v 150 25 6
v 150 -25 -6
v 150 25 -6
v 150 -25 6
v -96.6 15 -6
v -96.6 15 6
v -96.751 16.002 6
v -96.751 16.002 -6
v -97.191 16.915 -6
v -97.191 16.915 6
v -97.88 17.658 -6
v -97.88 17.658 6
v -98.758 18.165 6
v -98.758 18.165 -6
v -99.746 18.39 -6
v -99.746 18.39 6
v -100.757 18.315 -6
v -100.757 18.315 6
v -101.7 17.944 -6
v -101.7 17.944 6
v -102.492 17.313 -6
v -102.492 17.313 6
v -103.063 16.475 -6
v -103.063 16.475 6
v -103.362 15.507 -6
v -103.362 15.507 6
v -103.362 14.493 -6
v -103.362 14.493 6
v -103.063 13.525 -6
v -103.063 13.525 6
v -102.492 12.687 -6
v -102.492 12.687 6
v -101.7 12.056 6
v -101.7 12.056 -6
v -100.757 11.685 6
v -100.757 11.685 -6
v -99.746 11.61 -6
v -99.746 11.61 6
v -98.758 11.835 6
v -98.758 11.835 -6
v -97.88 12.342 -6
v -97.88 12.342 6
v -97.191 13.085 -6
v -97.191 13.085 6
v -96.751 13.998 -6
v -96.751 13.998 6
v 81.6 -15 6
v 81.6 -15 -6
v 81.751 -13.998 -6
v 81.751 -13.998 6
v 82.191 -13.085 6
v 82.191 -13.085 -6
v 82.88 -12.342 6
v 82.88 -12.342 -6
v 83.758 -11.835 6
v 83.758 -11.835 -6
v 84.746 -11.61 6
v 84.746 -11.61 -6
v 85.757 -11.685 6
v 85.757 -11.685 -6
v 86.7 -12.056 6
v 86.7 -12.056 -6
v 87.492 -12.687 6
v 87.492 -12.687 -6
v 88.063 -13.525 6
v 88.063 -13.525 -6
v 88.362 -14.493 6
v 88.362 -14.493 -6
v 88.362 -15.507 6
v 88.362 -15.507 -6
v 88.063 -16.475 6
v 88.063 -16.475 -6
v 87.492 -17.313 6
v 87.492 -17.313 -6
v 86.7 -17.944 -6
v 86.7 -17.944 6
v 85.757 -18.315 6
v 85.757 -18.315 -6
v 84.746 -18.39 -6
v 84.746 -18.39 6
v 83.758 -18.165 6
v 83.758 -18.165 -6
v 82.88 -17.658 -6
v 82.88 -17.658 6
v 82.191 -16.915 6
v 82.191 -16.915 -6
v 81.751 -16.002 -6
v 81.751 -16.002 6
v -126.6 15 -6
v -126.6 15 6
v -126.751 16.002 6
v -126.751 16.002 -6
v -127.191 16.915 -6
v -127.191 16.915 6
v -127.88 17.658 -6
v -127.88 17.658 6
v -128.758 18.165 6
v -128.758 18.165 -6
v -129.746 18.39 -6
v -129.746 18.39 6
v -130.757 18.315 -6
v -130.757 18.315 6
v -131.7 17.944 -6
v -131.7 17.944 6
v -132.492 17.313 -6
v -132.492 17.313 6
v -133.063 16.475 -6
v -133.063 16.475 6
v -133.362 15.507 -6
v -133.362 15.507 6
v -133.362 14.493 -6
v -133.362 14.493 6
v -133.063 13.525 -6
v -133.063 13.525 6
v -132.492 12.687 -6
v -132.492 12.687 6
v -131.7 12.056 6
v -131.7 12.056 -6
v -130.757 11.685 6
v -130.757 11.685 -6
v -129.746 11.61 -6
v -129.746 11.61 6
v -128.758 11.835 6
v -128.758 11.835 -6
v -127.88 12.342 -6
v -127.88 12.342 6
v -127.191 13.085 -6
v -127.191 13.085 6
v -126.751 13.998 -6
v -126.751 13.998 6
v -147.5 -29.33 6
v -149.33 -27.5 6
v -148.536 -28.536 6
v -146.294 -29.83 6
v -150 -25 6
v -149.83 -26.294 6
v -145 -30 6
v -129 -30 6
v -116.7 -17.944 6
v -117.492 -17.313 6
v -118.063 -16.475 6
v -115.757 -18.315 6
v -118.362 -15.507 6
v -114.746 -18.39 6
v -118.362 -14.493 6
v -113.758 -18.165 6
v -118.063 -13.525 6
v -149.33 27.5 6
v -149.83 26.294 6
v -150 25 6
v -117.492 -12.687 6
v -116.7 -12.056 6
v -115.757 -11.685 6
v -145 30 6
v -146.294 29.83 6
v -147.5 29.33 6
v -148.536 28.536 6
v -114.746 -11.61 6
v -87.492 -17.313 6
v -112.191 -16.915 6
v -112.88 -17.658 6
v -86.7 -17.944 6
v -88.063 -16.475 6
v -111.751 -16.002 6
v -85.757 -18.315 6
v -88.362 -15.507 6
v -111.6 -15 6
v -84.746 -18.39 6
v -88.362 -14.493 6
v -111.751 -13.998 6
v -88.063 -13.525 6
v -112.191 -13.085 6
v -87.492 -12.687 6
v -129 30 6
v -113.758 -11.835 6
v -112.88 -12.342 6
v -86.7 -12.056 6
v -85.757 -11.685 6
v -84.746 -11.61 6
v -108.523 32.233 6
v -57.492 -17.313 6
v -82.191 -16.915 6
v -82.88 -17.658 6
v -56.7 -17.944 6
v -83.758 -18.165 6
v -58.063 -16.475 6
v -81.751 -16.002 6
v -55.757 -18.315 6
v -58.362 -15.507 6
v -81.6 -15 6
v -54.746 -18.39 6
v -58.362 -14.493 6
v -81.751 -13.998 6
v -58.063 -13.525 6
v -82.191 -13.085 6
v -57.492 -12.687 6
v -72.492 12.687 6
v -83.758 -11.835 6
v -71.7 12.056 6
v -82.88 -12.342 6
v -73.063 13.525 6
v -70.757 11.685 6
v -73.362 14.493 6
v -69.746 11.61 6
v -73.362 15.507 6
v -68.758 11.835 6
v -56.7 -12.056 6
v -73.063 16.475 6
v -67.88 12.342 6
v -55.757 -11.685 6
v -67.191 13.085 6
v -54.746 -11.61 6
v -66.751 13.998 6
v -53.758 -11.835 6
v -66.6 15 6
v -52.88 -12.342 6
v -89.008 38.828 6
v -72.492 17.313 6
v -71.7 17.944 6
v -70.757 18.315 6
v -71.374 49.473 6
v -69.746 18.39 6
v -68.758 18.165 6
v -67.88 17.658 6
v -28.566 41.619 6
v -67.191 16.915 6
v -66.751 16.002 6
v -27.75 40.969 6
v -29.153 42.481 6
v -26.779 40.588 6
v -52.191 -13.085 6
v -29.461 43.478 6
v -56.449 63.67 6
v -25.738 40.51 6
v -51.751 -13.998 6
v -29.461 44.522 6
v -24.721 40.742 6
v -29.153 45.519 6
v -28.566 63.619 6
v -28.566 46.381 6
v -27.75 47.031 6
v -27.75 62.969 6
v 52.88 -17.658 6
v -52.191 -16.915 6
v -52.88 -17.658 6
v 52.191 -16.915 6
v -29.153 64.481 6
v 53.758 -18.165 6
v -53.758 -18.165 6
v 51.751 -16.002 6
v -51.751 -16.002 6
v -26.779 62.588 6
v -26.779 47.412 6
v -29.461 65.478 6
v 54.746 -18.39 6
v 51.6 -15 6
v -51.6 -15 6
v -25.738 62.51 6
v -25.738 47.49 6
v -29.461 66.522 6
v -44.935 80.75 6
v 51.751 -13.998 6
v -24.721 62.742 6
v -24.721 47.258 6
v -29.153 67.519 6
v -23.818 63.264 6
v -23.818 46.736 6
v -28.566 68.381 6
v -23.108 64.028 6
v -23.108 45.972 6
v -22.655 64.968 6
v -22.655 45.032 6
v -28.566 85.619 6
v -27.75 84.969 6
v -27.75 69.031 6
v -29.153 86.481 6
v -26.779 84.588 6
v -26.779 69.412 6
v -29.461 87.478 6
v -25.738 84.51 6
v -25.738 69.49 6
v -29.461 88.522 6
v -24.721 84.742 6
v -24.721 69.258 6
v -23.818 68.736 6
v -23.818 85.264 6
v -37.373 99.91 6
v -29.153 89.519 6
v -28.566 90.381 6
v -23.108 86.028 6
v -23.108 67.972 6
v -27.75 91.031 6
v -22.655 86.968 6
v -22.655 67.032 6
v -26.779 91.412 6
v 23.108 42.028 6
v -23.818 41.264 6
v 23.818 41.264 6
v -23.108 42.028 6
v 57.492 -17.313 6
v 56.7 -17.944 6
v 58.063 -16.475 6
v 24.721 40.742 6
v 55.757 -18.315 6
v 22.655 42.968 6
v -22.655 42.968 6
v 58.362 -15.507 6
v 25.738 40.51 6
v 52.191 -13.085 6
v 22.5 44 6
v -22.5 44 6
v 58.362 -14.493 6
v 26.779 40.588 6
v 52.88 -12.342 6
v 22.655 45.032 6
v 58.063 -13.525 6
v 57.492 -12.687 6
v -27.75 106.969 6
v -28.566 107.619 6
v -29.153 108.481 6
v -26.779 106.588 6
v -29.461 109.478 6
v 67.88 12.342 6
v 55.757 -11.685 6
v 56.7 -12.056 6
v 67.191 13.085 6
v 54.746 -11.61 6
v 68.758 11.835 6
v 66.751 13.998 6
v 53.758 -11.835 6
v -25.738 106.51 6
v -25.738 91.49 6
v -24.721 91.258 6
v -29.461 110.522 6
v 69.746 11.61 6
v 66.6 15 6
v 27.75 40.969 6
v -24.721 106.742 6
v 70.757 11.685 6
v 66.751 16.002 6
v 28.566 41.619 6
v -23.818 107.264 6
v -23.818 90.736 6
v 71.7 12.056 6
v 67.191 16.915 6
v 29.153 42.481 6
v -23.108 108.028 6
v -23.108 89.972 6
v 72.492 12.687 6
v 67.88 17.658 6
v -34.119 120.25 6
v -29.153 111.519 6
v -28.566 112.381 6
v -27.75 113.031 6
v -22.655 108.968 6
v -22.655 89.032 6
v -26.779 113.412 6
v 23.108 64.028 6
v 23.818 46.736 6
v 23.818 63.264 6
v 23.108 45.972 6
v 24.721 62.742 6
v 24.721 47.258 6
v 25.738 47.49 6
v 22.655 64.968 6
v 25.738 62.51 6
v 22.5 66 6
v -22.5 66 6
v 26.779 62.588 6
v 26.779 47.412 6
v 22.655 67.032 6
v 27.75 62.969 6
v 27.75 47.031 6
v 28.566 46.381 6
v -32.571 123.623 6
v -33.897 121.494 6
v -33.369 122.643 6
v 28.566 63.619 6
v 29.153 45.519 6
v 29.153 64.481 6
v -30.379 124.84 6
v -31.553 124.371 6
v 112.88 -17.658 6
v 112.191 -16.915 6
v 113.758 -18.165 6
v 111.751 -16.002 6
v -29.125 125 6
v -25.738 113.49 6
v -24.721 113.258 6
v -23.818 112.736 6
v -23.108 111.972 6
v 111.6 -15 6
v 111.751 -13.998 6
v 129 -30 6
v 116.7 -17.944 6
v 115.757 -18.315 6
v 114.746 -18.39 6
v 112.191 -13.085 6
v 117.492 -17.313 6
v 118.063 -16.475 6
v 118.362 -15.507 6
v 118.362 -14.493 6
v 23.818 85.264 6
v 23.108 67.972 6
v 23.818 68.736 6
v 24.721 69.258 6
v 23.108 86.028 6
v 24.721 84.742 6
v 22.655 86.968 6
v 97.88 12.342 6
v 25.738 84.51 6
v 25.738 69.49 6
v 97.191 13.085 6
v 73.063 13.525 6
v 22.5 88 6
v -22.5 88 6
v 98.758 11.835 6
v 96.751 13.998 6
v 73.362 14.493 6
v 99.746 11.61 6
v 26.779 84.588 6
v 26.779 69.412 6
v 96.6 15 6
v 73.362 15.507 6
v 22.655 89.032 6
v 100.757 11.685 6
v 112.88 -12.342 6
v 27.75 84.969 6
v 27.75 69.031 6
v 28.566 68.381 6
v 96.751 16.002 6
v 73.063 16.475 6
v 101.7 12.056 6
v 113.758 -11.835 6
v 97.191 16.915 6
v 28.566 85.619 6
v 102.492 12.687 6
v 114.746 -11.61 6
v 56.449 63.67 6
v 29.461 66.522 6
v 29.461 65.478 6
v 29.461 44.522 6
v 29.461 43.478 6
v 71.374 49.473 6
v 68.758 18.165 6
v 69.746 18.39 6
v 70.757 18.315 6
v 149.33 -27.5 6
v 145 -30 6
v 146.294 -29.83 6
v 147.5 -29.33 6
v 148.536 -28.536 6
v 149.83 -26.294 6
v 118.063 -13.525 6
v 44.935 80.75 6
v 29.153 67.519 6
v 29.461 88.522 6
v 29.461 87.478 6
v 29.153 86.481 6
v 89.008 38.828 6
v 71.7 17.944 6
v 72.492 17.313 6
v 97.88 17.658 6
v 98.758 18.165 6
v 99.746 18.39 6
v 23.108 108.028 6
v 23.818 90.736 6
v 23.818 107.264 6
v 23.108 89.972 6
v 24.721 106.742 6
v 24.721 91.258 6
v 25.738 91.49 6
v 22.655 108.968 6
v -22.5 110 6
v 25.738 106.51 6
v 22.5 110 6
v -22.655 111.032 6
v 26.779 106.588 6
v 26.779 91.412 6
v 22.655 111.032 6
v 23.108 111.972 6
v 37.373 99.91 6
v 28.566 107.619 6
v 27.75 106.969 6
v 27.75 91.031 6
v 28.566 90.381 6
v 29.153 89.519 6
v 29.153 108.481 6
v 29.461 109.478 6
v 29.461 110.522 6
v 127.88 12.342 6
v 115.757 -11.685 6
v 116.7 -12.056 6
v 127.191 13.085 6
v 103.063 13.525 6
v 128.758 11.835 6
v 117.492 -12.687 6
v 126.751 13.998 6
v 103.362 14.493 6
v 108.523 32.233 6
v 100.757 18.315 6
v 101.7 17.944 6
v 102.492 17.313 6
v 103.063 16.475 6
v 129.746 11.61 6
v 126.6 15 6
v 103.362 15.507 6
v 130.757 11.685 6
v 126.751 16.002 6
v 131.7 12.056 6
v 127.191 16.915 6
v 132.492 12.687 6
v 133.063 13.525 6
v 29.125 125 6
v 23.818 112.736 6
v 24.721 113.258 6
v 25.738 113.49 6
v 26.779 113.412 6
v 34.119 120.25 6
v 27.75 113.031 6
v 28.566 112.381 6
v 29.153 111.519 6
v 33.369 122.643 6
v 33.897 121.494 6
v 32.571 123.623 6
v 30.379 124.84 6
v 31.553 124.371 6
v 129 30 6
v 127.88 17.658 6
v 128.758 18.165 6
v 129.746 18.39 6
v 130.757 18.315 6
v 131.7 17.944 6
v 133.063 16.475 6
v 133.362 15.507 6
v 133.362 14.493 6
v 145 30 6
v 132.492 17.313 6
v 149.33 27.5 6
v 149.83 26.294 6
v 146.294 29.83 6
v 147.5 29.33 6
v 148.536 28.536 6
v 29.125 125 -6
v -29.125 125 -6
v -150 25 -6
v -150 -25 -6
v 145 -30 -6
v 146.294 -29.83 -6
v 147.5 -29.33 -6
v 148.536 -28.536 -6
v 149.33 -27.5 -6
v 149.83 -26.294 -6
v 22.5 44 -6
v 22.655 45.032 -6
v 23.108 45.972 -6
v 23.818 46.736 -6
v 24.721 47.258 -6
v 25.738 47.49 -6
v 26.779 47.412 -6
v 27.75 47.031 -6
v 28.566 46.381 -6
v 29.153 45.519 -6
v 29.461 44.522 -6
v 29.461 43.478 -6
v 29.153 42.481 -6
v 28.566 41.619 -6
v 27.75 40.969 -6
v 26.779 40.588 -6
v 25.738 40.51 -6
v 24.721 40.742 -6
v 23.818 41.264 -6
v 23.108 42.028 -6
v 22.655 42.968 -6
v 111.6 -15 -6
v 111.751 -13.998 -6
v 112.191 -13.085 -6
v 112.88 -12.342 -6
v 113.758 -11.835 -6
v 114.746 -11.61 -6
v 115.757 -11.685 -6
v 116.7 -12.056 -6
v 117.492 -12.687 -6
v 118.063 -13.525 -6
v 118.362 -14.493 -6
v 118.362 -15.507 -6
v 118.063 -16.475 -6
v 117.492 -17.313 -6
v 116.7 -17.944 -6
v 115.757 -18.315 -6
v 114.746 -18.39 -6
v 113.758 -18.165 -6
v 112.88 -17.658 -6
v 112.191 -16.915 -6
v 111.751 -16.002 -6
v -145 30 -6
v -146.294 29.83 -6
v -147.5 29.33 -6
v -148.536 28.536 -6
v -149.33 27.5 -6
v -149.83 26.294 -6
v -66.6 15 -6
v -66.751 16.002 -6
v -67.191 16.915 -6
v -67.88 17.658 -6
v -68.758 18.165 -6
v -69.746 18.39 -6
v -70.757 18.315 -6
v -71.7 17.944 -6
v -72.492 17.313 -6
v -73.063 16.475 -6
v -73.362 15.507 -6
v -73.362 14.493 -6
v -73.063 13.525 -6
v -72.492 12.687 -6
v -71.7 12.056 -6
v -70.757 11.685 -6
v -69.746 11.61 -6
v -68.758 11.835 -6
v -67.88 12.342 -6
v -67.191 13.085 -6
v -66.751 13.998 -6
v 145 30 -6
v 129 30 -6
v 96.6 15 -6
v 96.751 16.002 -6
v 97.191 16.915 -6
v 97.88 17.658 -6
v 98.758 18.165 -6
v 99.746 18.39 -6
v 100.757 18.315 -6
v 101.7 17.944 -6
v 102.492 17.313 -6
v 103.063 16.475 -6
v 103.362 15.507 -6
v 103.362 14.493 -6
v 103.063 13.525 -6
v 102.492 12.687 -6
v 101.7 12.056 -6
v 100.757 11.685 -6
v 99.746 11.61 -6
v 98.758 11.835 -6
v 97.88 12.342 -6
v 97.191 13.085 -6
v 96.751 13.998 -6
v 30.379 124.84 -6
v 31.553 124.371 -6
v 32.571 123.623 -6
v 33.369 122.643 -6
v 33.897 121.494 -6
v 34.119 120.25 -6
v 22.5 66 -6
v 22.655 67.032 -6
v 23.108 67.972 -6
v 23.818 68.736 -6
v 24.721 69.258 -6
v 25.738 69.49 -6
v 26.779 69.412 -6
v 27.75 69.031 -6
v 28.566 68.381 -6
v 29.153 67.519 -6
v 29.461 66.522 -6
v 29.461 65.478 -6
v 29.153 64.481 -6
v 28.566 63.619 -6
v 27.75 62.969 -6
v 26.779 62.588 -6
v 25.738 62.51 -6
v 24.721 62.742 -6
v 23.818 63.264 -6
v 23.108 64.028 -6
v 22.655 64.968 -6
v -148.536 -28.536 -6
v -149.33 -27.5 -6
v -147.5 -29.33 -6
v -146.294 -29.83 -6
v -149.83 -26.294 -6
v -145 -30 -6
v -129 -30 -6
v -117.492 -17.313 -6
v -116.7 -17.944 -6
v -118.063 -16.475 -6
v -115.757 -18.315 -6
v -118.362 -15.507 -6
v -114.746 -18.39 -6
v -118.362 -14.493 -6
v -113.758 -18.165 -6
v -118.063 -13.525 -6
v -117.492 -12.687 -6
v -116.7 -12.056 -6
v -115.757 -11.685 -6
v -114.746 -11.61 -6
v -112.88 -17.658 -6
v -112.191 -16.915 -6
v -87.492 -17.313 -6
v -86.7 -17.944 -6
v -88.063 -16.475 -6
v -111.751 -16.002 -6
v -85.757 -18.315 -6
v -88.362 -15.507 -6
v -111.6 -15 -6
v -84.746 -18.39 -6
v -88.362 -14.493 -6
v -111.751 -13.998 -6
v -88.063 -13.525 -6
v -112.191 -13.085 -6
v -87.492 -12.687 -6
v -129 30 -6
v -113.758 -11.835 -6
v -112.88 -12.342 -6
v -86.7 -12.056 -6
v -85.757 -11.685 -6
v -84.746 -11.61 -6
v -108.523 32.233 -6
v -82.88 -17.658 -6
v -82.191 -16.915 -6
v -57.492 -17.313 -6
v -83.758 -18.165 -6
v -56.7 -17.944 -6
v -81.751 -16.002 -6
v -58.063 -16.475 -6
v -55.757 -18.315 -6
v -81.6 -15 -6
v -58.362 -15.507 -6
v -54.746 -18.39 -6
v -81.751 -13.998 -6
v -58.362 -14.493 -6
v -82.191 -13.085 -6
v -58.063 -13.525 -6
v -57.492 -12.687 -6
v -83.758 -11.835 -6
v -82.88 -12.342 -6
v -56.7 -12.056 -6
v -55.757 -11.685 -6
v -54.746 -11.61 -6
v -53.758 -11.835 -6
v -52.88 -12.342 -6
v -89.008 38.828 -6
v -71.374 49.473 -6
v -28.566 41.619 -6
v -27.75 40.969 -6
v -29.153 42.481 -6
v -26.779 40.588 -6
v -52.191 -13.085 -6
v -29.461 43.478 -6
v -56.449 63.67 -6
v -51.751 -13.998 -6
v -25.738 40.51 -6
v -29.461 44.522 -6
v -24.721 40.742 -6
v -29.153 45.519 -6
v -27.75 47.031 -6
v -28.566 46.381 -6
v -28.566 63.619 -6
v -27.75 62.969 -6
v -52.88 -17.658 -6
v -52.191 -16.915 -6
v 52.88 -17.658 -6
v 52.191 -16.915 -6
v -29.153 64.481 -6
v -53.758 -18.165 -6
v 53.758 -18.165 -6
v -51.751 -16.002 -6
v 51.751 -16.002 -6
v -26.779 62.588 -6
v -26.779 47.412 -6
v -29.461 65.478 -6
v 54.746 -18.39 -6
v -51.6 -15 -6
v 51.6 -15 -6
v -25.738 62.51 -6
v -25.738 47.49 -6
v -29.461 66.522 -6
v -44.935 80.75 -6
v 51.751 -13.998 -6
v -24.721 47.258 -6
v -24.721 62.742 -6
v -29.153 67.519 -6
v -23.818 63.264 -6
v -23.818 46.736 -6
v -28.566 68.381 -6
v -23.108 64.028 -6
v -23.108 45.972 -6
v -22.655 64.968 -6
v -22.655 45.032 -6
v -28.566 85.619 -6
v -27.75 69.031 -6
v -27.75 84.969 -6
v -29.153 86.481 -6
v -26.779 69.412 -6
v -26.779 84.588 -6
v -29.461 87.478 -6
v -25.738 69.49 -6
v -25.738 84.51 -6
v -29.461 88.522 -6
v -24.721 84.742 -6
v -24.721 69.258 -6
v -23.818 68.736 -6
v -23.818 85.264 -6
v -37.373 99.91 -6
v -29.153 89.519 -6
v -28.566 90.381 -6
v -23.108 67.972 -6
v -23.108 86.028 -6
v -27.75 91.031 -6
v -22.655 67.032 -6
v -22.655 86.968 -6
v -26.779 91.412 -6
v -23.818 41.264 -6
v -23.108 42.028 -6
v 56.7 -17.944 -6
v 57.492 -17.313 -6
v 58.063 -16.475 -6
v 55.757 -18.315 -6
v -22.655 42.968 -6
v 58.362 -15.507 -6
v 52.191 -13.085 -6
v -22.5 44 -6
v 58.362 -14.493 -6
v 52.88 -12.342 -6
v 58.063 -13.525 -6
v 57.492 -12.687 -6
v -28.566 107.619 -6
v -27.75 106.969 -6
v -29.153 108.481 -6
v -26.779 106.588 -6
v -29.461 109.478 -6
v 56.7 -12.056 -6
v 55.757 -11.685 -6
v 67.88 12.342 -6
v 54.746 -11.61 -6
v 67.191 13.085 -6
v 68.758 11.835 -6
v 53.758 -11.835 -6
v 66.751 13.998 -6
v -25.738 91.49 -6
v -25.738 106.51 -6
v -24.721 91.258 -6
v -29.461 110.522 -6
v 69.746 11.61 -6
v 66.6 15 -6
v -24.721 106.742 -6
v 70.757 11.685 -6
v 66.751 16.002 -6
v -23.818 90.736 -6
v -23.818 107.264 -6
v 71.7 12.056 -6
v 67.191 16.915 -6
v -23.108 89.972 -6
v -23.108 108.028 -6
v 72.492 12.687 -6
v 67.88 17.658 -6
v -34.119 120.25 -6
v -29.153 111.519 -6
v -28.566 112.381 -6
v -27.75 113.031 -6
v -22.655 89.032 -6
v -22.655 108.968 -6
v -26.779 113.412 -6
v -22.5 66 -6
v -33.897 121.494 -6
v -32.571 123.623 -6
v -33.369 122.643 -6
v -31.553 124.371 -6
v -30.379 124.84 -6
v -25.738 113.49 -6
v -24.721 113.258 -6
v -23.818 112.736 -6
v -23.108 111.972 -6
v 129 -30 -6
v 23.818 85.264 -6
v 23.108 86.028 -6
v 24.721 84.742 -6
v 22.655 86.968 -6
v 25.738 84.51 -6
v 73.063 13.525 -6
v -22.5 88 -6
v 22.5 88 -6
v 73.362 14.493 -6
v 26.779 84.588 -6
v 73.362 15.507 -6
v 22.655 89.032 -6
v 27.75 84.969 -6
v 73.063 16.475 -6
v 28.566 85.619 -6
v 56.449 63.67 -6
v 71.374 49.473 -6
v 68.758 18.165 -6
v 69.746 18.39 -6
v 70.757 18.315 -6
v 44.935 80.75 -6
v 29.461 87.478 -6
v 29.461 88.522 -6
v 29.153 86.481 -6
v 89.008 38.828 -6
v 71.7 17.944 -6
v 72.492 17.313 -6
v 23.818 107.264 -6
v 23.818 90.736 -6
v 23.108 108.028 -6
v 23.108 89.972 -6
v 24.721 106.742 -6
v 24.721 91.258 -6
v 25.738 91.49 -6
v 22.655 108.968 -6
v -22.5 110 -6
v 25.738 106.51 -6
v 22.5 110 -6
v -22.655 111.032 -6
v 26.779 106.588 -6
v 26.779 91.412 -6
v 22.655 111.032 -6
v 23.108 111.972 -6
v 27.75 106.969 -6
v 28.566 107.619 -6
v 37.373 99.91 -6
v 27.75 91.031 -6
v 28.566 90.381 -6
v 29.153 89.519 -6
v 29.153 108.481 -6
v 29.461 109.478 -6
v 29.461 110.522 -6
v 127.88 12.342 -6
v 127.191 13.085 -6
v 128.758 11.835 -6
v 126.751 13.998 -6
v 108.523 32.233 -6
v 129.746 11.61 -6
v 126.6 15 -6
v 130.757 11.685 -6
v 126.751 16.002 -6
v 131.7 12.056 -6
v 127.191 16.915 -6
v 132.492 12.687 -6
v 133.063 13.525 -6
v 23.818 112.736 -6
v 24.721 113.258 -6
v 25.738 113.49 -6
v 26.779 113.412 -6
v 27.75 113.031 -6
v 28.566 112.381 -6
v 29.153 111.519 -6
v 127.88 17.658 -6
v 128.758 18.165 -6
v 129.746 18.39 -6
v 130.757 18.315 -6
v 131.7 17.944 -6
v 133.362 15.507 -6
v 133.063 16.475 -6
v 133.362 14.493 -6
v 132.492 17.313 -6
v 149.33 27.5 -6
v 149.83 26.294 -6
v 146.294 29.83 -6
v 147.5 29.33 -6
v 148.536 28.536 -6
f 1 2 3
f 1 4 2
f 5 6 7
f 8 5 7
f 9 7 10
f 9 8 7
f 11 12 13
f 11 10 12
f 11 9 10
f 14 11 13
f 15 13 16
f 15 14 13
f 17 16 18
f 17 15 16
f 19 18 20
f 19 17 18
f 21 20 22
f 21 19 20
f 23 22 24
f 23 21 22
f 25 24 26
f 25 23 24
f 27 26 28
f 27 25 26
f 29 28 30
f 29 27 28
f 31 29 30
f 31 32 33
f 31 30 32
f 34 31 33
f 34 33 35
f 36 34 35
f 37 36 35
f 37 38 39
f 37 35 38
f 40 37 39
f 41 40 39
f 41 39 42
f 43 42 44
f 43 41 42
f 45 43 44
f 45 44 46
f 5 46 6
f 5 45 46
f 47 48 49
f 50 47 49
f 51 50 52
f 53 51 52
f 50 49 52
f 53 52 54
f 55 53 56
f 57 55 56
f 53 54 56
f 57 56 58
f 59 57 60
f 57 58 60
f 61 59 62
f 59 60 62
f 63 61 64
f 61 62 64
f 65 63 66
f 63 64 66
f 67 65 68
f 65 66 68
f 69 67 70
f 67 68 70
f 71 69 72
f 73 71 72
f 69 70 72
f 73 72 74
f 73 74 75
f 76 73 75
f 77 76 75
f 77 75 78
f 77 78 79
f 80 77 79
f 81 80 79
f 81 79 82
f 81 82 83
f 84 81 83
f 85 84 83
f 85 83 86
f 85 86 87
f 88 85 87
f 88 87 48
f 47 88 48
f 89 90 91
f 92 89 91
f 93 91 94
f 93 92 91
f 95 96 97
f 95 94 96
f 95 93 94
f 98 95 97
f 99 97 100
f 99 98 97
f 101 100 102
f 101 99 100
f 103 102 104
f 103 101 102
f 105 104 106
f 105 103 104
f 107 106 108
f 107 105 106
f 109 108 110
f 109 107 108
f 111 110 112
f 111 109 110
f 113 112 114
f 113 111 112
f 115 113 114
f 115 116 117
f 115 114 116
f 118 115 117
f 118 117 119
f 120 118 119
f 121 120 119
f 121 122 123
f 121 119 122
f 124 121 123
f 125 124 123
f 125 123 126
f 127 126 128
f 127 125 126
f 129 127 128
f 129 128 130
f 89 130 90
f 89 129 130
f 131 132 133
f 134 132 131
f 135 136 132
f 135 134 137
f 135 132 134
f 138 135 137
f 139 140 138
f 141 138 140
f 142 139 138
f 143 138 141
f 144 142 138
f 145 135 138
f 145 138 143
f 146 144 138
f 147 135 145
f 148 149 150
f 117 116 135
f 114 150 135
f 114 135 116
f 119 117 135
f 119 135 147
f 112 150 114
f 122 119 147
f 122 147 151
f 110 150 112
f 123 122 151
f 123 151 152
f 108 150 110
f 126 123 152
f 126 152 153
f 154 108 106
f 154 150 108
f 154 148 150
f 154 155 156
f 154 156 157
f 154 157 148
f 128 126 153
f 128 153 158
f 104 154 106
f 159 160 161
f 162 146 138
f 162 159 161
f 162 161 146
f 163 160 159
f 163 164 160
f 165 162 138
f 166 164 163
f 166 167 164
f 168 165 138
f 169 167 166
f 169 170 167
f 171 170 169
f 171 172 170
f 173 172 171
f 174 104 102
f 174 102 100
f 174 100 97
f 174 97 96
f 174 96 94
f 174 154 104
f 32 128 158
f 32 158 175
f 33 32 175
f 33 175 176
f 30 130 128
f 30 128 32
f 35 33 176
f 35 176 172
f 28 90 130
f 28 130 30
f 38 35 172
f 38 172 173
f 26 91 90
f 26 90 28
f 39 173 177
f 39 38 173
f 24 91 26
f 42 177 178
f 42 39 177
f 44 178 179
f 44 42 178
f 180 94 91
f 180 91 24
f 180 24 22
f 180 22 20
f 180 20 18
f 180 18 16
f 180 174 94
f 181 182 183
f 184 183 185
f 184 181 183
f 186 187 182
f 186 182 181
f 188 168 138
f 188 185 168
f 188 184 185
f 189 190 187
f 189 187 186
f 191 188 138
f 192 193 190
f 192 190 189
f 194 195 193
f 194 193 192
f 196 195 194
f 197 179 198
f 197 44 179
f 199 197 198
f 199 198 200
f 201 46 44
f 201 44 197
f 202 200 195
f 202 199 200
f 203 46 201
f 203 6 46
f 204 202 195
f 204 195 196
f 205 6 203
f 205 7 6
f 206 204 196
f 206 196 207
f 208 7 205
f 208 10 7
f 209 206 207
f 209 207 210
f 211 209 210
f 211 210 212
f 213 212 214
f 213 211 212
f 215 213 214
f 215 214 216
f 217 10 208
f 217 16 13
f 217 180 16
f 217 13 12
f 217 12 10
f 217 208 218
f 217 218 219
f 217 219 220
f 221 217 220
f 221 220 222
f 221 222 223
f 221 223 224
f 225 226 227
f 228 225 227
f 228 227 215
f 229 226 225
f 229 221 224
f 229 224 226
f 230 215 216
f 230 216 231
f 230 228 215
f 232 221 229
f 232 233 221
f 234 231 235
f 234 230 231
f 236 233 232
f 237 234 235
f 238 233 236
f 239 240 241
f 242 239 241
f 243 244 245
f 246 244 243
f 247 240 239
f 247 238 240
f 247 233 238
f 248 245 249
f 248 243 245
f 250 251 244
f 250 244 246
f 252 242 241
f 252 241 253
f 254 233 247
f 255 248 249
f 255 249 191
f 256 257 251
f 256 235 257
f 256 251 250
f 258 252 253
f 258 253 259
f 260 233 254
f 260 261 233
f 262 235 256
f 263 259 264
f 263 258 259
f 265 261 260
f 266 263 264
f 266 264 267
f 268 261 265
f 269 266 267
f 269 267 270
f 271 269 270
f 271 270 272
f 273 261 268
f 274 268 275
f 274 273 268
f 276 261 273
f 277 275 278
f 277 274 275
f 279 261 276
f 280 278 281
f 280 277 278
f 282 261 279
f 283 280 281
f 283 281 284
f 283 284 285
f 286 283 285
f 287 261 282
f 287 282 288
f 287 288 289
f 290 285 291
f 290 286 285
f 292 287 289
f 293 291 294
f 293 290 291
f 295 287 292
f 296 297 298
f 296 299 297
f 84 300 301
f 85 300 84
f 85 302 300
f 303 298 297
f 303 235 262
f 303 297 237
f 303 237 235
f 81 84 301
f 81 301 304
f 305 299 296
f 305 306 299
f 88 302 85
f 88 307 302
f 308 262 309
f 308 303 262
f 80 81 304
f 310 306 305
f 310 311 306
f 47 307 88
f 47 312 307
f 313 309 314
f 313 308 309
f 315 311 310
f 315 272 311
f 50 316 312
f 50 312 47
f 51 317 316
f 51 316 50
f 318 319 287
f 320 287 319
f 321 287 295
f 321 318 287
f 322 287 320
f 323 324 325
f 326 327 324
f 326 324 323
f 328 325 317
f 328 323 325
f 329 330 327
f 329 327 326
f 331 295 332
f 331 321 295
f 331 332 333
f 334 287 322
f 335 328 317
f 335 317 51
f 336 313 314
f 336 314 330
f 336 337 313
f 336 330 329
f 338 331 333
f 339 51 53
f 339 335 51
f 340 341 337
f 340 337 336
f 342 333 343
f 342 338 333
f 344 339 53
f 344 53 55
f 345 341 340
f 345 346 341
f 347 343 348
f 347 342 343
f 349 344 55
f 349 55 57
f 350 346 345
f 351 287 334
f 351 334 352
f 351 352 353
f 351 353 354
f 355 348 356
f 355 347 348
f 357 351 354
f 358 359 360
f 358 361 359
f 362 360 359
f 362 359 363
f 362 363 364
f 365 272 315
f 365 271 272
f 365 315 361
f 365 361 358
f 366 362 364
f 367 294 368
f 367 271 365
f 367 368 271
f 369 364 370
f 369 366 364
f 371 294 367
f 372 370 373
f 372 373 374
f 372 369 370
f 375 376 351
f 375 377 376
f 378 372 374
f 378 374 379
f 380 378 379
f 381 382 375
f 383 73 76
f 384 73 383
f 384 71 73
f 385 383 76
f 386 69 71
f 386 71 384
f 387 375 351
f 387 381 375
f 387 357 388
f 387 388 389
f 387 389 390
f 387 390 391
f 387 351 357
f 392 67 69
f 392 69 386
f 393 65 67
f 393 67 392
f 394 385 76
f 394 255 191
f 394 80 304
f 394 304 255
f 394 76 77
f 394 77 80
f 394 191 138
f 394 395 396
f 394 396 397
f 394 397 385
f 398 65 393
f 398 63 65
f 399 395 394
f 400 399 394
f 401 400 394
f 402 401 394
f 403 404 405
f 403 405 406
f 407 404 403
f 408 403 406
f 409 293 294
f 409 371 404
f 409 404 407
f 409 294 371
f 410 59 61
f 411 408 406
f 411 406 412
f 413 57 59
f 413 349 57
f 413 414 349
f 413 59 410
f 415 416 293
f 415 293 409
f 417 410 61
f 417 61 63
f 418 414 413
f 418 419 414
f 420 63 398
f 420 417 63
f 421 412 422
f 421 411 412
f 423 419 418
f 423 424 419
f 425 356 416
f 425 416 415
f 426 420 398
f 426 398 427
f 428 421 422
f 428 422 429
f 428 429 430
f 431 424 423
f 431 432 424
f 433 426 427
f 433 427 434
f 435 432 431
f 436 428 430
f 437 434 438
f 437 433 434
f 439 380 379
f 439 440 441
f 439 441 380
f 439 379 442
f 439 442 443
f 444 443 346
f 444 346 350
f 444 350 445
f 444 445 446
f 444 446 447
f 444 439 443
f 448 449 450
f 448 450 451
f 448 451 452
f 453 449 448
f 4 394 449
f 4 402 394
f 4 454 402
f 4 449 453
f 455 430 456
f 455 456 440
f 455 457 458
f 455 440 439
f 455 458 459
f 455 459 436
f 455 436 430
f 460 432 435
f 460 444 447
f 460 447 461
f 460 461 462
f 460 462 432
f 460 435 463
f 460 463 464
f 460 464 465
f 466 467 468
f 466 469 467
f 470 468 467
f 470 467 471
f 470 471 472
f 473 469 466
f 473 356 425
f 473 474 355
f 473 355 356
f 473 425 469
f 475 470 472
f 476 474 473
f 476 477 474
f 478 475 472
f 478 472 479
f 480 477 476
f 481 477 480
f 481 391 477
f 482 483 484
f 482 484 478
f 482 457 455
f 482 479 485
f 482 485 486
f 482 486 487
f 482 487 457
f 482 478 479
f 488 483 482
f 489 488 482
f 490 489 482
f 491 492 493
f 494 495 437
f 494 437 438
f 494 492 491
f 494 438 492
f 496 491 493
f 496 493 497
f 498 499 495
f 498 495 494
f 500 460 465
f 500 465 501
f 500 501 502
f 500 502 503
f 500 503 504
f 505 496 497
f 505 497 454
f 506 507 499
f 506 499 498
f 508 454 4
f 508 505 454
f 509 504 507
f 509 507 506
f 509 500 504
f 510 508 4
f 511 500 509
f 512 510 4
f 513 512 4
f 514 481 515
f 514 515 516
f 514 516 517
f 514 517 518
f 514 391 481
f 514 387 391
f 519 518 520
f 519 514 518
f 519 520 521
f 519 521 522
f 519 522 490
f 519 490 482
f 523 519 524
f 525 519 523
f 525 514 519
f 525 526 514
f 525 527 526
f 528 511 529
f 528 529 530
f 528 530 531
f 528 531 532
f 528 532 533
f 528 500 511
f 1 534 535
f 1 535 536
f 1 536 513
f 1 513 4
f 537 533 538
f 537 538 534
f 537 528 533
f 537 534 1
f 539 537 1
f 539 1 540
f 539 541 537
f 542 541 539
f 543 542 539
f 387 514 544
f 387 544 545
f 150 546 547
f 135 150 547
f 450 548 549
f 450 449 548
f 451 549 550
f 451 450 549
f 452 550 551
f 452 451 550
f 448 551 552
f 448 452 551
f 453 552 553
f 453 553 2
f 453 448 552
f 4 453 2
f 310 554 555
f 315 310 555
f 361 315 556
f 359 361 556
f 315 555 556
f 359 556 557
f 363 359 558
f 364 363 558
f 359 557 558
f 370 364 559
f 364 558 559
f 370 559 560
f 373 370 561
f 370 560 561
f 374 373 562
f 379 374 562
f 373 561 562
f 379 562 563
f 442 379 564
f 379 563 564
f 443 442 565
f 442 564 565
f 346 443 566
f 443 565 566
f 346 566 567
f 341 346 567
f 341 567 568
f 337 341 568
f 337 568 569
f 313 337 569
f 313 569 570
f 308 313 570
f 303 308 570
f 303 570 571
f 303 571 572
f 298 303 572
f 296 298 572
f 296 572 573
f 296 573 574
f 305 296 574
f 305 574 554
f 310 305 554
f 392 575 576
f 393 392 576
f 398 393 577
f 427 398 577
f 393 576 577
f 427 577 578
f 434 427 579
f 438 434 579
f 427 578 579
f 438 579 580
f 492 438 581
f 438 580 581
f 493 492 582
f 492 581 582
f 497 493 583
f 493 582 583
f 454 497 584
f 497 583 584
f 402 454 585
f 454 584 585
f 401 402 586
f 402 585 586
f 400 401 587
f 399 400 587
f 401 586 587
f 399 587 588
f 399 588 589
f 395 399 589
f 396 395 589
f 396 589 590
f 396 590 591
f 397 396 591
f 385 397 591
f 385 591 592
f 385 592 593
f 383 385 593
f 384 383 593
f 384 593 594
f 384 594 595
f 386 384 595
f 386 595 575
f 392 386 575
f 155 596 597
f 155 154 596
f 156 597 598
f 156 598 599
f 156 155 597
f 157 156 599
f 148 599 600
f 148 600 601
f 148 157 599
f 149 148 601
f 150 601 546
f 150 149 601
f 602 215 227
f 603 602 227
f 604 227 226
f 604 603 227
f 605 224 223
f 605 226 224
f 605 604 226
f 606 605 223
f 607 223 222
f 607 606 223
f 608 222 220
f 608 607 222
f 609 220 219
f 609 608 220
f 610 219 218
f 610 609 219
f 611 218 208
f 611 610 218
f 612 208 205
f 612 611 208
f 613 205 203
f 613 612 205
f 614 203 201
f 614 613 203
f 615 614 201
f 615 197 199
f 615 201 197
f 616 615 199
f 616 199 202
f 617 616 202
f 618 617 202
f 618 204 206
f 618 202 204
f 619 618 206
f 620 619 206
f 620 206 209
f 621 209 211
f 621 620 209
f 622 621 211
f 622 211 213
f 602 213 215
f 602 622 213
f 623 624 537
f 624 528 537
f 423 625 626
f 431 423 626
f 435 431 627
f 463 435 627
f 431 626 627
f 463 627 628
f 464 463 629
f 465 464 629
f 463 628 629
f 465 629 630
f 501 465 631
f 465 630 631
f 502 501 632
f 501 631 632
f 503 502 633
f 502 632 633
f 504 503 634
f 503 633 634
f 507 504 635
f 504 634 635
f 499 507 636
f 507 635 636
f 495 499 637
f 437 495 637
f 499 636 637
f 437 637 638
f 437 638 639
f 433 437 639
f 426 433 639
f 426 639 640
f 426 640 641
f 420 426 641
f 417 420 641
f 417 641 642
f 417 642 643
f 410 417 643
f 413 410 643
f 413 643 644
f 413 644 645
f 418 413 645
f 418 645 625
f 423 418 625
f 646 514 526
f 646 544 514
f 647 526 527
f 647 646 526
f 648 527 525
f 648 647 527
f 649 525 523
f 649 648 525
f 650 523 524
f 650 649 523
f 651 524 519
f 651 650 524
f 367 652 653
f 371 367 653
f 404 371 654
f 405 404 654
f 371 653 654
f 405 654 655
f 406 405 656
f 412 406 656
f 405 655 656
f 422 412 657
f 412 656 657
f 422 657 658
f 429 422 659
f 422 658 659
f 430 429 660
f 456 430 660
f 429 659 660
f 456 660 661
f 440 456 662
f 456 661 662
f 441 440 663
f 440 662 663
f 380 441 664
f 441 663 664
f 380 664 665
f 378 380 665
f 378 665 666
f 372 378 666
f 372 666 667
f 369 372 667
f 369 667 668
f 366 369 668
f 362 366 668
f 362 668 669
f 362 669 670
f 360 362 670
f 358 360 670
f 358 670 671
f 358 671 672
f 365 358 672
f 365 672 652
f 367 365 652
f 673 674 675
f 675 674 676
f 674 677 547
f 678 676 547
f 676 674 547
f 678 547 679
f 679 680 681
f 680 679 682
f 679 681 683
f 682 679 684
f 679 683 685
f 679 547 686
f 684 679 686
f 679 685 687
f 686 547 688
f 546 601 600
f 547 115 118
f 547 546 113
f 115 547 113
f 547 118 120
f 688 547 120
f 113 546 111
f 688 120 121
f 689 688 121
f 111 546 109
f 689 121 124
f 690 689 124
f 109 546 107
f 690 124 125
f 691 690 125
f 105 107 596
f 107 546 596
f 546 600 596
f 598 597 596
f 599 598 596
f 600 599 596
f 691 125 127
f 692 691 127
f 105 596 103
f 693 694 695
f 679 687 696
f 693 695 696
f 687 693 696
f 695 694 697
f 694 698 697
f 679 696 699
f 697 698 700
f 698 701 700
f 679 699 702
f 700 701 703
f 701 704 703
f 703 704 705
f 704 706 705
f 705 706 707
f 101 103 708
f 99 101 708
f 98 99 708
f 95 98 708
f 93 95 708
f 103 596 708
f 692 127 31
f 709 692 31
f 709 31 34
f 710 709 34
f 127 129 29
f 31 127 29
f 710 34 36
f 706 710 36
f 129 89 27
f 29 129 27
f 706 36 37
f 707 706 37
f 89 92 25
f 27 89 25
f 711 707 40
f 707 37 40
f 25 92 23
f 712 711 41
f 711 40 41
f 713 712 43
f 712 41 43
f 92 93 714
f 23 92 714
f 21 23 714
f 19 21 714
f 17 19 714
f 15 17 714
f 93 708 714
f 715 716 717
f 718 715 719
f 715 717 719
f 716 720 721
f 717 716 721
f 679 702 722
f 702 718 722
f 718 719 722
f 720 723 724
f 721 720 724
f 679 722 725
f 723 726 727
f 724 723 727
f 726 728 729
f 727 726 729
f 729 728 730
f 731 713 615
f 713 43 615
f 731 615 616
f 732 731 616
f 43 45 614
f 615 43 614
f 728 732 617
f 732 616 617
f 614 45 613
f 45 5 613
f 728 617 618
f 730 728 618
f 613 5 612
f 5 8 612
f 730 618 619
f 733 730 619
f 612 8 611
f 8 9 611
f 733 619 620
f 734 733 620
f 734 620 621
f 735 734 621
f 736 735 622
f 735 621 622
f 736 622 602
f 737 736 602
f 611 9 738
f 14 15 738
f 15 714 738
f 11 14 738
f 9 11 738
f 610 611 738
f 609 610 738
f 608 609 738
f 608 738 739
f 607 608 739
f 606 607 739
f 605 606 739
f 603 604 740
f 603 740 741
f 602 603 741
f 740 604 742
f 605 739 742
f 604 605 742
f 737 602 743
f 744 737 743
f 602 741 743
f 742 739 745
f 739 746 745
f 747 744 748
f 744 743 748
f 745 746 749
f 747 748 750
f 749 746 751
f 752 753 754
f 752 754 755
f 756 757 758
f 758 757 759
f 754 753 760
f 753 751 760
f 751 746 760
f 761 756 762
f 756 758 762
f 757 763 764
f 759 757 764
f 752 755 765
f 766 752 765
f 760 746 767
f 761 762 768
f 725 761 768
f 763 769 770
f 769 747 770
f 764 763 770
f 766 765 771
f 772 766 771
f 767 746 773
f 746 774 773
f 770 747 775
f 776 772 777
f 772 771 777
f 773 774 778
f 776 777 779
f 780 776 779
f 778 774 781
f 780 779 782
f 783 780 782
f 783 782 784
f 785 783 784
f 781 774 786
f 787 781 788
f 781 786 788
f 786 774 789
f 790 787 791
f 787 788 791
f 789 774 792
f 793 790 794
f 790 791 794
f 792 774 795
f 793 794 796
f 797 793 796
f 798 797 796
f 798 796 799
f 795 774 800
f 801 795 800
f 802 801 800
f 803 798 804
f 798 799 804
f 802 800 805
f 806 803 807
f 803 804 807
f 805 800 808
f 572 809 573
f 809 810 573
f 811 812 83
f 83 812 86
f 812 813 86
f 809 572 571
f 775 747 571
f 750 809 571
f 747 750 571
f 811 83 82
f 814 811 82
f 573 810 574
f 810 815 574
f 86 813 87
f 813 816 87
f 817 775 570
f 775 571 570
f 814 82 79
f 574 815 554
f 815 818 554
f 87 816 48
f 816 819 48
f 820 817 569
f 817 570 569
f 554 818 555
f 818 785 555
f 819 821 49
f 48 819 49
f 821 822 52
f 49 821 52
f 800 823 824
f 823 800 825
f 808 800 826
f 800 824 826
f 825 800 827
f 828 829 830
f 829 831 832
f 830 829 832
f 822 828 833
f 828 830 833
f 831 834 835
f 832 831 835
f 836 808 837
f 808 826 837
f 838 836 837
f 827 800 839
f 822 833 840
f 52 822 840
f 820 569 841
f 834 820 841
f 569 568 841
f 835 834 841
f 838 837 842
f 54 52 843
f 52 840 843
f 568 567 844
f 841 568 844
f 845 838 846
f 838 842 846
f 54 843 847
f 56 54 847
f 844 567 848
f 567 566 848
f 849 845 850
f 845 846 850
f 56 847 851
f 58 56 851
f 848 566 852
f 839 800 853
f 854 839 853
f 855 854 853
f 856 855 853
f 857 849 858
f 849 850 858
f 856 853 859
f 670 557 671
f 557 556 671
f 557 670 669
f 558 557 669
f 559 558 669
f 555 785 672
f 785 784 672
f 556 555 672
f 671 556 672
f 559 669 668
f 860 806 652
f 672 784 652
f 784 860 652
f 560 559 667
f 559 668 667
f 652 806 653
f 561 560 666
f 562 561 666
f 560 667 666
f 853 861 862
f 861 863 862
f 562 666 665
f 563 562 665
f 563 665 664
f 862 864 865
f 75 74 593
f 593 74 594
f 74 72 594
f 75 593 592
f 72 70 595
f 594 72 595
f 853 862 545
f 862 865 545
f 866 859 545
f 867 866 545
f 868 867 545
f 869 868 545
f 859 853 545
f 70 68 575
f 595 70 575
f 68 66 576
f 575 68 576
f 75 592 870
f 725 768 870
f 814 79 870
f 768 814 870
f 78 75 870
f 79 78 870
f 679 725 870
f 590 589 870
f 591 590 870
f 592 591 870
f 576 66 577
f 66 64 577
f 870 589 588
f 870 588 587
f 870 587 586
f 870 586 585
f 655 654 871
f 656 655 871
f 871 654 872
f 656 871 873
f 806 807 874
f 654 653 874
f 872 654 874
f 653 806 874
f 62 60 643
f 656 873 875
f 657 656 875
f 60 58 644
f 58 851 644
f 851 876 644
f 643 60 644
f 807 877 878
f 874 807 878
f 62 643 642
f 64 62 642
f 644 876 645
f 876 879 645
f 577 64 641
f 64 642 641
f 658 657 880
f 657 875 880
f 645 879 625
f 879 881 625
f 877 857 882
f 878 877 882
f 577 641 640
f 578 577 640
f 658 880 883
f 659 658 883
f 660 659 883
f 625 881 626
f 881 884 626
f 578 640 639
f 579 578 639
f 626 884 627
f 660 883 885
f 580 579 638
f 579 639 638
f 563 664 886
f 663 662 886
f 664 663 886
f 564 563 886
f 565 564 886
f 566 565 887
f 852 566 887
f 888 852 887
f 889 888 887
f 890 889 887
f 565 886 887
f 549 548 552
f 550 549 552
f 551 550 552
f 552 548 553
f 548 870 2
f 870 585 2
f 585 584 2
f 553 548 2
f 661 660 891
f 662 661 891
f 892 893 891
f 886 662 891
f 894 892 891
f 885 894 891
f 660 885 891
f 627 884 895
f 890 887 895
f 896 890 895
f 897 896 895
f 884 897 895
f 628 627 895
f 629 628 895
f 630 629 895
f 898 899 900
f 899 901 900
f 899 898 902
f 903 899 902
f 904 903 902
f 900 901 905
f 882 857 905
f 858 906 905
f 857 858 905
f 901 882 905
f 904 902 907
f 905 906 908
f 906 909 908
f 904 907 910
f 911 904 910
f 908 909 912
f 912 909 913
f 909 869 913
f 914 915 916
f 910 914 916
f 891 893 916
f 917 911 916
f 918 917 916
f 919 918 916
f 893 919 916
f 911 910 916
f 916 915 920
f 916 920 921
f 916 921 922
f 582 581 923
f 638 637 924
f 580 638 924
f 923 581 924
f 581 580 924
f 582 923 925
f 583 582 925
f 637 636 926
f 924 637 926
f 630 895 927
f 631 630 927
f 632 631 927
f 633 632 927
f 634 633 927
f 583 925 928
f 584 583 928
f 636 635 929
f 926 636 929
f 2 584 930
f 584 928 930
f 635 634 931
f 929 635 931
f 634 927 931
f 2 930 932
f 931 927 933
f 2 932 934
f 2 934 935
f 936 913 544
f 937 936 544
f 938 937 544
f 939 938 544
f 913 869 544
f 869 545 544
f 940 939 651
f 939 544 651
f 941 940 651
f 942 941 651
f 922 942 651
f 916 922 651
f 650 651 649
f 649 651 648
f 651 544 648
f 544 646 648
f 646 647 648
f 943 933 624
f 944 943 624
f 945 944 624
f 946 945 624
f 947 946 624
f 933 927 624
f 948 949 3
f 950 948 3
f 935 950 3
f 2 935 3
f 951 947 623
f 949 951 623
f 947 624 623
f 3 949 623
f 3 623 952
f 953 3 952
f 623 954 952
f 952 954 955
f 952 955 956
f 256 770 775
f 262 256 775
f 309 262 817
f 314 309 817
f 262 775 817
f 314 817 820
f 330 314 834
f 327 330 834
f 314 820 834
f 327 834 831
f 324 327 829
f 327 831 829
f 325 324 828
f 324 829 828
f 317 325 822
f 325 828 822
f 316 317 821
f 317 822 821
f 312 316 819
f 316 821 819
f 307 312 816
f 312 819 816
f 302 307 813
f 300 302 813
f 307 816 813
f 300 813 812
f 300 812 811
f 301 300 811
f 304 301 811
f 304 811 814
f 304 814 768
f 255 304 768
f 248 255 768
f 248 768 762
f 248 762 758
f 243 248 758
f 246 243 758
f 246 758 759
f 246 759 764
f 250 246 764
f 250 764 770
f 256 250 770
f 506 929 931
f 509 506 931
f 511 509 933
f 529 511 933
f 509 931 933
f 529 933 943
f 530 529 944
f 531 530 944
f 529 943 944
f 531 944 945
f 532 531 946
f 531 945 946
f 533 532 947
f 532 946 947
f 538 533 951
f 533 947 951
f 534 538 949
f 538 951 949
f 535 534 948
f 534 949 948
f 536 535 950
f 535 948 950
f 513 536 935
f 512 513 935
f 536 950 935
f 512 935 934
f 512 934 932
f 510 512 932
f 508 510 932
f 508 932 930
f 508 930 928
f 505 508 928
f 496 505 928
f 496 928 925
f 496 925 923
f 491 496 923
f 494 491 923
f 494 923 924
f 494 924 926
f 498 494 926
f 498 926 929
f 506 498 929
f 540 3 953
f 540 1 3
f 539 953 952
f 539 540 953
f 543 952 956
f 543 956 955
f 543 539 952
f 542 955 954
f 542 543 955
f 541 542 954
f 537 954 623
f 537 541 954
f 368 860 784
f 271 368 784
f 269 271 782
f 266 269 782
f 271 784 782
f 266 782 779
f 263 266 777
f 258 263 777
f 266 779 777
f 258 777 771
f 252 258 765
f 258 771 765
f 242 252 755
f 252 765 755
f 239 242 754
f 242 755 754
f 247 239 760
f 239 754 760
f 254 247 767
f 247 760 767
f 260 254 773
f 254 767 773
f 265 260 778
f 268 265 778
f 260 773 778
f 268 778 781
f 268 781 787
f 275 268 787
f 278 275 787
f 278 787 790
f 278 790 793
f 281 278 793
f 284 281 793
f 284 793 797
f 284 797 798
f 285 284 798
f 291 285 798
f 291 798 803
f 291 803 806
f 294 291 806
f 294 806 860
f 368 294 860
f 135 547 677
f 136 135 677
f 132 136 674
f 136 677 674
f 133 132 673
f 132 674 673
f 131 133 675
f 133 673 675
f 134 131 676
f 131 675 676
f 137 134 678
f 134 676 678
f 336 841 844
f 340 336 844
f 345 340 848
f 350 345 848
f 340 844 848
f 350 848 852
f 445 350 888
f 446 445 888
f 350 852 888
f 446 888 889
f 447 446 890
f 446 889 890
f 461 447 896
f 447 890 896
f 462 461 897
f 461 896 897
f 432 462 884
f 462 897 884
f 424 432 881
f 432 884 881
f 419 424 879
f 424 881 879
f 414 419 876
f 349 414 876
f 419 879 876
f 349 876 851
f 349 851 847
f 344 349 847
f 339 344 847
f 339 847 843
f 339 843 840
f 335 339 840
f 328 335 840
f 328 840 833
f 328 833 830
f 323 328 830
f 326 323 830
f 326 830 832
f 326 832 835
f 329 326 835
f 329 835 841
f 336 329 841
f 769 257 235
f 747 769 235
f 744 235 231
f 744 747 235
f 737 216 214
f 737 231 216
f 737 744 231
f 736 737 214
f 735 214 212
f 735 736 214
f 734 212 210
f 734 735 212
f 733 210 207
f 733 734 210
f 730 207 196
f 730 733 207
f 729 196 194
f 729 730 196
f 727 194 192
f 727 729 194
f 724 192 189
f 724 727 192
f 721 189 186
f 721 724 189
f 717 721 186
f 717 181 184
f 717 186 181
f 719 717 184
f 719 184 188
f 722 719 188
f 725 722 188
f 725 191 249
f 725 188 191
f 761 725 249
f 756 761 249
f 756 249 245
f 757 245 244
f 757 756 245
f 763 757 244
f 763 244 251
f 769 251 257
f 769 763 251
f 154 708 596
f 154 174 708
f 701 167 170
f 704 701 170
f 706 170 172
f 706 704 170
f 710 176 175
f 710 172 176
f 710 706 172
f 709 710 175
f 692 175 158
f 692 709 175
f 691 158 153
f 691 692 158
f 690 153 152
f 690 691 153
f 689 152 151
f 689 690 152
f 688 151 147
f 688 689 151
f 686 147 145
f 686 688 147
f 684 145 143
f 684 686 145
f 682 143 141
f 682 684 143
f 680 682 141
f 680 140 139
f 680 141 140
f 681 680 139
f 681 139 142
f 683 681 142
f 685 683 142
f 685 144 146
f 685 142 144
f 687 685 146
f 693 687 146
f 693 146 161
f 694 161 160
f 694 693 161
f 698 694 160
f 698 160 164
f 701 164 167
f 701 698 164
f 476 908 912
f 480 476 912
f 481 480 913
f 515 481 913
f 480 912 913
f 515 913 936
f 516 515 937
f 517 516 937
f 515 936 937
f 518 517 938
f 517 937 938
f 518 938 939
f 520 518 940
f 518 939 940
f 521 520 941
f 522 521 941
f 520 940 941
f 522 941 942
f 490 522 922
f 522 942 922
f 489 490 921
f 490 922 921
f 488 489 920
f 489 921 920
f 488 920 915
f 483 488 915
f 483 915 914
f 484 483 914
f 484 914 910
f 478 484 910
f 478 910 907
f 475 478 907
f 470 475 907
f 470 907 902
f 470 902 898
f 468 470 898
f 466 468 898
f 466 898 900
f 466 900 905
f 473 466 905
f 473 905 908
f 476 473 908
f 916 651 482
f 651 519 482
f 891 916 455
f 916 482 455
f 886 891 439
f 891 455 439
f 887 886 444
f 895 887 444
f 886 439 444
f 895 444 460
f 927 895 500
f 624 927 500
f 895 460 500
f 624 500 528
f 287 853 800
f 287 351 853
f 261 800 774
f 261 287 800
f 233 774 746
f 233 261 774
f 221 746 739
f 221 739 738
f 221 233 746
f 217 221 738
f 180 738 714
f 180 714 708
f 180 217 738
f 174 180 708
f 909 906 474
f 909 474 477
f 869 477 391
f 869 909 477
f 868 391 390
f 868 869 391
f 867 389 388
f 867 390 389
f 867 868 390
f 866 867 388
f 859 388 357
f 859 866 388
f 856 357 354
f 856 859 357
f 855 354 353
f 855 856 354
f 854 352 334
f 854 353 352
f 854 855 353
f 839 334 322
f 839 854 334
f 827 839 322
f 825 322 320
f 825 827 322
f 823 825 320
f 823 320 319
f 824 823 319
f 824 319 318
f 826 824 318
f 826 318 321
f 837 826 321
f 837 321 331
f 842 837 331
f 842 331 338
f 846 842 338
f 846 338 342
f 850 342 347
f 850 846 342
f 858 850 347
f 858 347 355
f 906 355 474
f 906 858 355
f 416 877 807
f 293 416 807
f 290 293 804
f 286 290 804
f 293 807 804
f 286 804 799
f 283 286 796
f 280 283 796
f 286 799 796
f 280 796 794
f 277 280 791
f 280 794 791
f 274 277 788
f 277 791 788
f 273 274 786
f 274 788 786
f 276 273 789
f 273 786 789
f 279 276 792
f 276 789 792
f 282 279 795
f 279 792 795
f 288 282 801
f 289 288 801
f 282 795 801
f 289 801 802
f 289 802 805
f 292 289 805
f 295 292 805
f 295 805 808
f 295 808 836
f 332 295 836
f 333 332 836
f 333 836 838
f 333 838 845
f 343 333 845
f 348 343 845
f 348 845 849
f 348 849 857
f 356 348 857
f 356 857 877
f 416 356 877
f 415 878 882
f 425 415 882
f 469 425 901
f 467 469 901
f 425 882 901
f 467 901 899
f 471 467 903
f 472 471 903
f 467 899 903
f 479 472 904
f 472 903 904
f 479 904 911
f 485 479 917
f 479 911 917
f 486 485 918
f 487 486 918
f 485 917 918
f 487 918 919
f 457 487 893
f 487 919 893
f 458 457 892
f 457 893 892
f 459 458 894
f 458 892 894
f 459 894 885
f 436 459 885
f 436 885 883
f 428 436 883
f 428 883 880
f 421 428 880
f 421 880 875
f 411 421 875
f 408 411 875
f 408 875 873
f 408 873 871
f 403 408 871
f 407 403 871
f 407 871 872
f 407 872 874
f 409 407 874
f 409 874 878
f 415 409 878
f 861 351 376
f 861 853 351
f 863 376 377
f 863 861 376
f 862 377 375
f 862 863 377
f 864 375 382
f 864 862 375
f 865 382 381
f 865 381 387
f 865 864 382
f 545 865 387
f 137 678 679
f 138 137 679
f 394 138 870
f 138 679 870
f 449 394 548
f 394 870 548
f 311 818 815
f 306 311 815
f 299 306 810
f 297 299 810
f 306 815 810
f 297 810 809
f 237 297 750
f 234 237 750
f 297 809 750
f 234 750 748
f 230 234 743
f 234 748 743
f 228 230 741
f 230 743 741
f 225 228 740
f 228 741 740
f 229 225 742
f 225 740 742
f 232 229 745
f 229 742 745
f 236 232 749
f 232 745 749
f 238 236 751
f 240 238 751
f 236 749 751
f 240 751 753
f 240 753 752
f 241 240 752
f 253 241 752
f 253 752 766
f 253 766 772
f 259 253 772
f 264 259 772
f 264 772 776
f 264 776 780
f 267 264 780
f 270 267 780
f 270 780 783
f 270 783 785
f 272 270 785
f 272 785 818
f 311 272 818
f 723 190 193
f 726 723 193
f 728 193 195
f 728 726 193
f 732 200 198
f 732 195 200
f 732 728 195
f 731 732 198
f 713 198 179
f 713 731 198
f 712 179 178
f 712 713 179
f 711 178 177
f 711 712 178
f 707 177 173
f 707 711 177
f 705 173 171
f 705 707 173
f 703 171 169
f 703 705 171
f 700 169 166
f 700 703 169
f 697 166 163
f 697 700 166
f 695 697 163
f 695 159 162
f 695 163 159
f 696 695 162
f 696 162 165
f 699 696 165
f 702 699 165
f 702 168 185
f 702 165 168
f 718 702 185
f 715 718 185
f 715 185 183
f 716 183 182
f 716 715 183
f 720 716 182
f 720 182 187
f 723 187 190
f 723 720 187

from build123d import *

# Parameters (mm, degrees)
BOSS_EXTRUDE1_DEPTH        = 6
F_7_0_7_DIAMETER_HOLE1_D   = 7
LPATTERN1_COUNT            = 4
LPATTERN1_PITCH            = 22
FILLET1_R                  = 5
MIRROR1_COPY_1_D           = 7
MIRROR1_COPY_2_D           = 7
MIRROR1_COPY_3_D           = 7
FILLET1_OF_MIRROR1_R       = 5
MIRROR5_COPY_1_D           = 7
MIRROR5_COPY_2_D           = 7
MIRROR5_COPY_3_D           = 7
FILLET1_OF_MIRROR5_R       = 5
MIRROR6_START              = -6
MIRROR6_OUTLINE_R          = 3.5
MIRROR6_DEPTH              = 12
F_6_8_6_8_DIAMETER_HOLE1_D = 6.8
SKETCH9_W                  = 314.382892994
SKETCH9_H                  = 141.517755545
CUT_EXTRUDE1_DEPTH         = 196.624640575


# Read off the part's stored shape, not the designer's step: Mirror6
with BuildPart() as part:
    # Sketch1 → Boss-Extrude1 (new, symmetric)
    with BuildSketch(Plane.XY):
        with BuildLine():
            Line((0, 0), (0, 125))
            Line((0, 125), (34, 125))
            ThreePointArc((34, 125), (61.824855787, 57.824855787), (129, 30))
            Line((129, 30), (150, 30))
            Line((150, 30), (150, 0))
            Line((150, 0), (114.303256495, 0))
            Line((114.303256495, 0), (0, 0))
        make_face()
    boss_extrude1 = extrude(amount=BOSS_EXTRUDE1_DEPTH, both=True)

    # Ø7.0 (7) Diameter Hole1 (through all)
    with Locations(Plane.XY.offset(6)):
        with Locations((26, 110)):
            f_7_0_7_diameter_hole1 = Hole(F_7_0_7_DIAMETER_HOLE1_D / 2)

    # LPattern1: Ø7.0 (7) Diameter Hole1 ×4
    with Locations(*[(0, -i * LPATTERN1_PITCH, 0) for i in range(1, LPATTERN1_COUNT)]):
        add(f_7_0_7_diameter_hole1, mode=Mode.SUBTRACT)

    # Fillet1
    fillet1_edges = [part.edges().sort_by_distance(p)[0] for p in [
        (34, 125, 0),
        (150, 30, 0),
    ]]
    fillet(fillet1_edges, radius=FILLET1_R)

    # Mirror1: Boss-Extrude1, Ø7.0 (7) Diameter Hole1 across plane
    add(boss_extrude1.mirror(Plane(origin=(0, 0, 6), x_dir=(0, 0, 1), z_dir=(1, 0, 0))))
    add(f_7_0_7_diameter_hole1.mirror(Plane(origin=(0, 0, 6), x_dir=(0, 0, 1), z_dir=(1, 0, 0))), mode=Mode.SUBTRACT)

    # Mirror1 copy 1 (through all)
    with Locations(Plane(origin=(0, -22, 6), x_dir=(-1, 0, 0), z_dir=(0, 0, 1))):
        with Locations((26, -110)):
            Hole(MIRROR1_COPY_1_D / 2)

    # Mirror1 copy 2 (through all)
    with Locations(Plane(origin=(0, -44, 6), x_dir=(-1, 0, 0), z_dir=(0, 0, 1))):
        with Locations((26, -110)):
            Hole(MIRROR1_COPY_2_D / 2)

    # Mirror1 copy 3 (through all)
    with Locations(Plane(origin=(0, -66, 6), x_dir=(-1, 0, 0), z_dir=(0, 0, 1))):
        with Locations((26, -110)):
            Hole(MIRROR1_COPY_3_D / 2)

    # Fillet1 of Mirror1
    fillet1_of_mirror1_edges = [part.edges().sort_by_distance(p)[0] for p in [
        (-34, 125, 0),
        (-150, 30, 0),
    ]]
    fillet(fillet1_of_mirror1_edges, radius=FILLET1_OF_MIRROR1_R)

    # Mirror5: Boss-Extrude1, Ø7.0 (7) Diameter Hole1 across plane
    add(boss_extrude1.mirror(Plane.ZX))
    add(f_7_0_7_diameter_hole1.mirror(Plane.ZX), mode=Mode.SUBTRACT)

    # Mirror5 copy 1 (through all)
    with Locations(Plane(origin=(0, 22, 6), x_dir=(1, 0, 0), z_dir=(0, 0, 1))):
        with Locations((26, -110)):
            Hole(MIRROR5_COPY_1_D / 2)

    # Mirror5 copy 2 (through all)
    with Locations(Plane(origin=(0, 44, 6), x_dir=(1, 0, 0), z_dir=(0, 0, 1))):
        with Locations((26, -110)):
            Hole(MIRROR5_COPY_2_D / 2)

    # Mirror5 copy 3 (through all)
    with Locations(Plane(origin=(0, 66, 6), x_dir=(1, 0, 0), z_dir=(0, 0, 1))):
        with Locations((26, -110)):
            Hole(MIRROR5_COPY_3_D / 2)

    # Fillet1 of Mirror5
    fillet1_of_mirror5_edges = [part.edges().sort_by_distance(p)[0] for p in [
        (34, -125, 0),
        (150, -30, 0),
    ]]
    fillet(fillet1_of_mirror5_edges, radius=FILLET1_OF_MIRROR5_R)

    # Mirror6 outline → Mirror6 (add)
    with BuildSketch(Plane.XY.offset(MIRROR6_START)):
        with BuildLine():
            Line((0, 0), (-150, 0))
            Line((-150, 0), (-150, -25))
            ThreePointArc((-150, -25), (-148.535533906, -28.535533906), (-145, -30))
            Line((-145, -30), (-129, -30))
            ThreePointArc((-129, -30), (-63.525768428, -56.165960456), (-34.118824312, -120.25))
            ThreePointArc((-34.118824312, -120.25), (-32.571090411, -123.622844187), (-29.125078223, -125))
            Line((-29.125078223, -125), (0, -125))
            Line((0, -125), (0, 0))
        make_face()
        with Locations((-26, -110)):
            Circle(MIRROR6_OUTLINE_R, mode=Mode.SUBTRACT)
        with Locations((-26, -88)):
            Circle(MIRROR6_OUTLINE_R, mode=Mode.SUBTRACT)
        with Locations((-26, -66)):
            Circle(MIRROR6_OUTLINE_R, mode=Mode.SUBTRACT)
        with Locations((-26, -44)):
            Circle(MIRROR6_OUTLINE_R, mode=Mode.SUBTRACT)
    extrude(amount=MIRROR6_DEPTH)

    # Ø6.8 (6.8) Diameter Hole1 (through all)
    with Locations(Plane.XY.offset(6)):
        with Locations((130, 15), (100, 15), (70, 15), (115, -15), (85, -15), (55, -15)):
            f_6_8_6_8_diameter_hole1 = Hole(F_6_8_6_8_DIAMETER_HOLE1_D / 2)

    # Mirror7: Ø6.8 (6.8) Diameter Hole1 across plane
    add(f_6_8_6_8_diameter_hole1.mirror(Plane(origin=(0, 0, 0), x_dir=(0, 0, 1), z_dir=(1, 0, 0))), mode=Mode.SUBTRACT)

    # Sketch9 → Cut-Extrude1 (cut, through all)
    with BuildSketch(Plane.XY.offset(6)):
        with Locations((3.183624233, -100.758877772)):
            Rectangle(SKETCH9_W, SKETCH9_H)
    extrude(amount=-CUT_EXTRUDE1_DEPTH, mode=Mode.SUBTRACT)


solid = part.part
